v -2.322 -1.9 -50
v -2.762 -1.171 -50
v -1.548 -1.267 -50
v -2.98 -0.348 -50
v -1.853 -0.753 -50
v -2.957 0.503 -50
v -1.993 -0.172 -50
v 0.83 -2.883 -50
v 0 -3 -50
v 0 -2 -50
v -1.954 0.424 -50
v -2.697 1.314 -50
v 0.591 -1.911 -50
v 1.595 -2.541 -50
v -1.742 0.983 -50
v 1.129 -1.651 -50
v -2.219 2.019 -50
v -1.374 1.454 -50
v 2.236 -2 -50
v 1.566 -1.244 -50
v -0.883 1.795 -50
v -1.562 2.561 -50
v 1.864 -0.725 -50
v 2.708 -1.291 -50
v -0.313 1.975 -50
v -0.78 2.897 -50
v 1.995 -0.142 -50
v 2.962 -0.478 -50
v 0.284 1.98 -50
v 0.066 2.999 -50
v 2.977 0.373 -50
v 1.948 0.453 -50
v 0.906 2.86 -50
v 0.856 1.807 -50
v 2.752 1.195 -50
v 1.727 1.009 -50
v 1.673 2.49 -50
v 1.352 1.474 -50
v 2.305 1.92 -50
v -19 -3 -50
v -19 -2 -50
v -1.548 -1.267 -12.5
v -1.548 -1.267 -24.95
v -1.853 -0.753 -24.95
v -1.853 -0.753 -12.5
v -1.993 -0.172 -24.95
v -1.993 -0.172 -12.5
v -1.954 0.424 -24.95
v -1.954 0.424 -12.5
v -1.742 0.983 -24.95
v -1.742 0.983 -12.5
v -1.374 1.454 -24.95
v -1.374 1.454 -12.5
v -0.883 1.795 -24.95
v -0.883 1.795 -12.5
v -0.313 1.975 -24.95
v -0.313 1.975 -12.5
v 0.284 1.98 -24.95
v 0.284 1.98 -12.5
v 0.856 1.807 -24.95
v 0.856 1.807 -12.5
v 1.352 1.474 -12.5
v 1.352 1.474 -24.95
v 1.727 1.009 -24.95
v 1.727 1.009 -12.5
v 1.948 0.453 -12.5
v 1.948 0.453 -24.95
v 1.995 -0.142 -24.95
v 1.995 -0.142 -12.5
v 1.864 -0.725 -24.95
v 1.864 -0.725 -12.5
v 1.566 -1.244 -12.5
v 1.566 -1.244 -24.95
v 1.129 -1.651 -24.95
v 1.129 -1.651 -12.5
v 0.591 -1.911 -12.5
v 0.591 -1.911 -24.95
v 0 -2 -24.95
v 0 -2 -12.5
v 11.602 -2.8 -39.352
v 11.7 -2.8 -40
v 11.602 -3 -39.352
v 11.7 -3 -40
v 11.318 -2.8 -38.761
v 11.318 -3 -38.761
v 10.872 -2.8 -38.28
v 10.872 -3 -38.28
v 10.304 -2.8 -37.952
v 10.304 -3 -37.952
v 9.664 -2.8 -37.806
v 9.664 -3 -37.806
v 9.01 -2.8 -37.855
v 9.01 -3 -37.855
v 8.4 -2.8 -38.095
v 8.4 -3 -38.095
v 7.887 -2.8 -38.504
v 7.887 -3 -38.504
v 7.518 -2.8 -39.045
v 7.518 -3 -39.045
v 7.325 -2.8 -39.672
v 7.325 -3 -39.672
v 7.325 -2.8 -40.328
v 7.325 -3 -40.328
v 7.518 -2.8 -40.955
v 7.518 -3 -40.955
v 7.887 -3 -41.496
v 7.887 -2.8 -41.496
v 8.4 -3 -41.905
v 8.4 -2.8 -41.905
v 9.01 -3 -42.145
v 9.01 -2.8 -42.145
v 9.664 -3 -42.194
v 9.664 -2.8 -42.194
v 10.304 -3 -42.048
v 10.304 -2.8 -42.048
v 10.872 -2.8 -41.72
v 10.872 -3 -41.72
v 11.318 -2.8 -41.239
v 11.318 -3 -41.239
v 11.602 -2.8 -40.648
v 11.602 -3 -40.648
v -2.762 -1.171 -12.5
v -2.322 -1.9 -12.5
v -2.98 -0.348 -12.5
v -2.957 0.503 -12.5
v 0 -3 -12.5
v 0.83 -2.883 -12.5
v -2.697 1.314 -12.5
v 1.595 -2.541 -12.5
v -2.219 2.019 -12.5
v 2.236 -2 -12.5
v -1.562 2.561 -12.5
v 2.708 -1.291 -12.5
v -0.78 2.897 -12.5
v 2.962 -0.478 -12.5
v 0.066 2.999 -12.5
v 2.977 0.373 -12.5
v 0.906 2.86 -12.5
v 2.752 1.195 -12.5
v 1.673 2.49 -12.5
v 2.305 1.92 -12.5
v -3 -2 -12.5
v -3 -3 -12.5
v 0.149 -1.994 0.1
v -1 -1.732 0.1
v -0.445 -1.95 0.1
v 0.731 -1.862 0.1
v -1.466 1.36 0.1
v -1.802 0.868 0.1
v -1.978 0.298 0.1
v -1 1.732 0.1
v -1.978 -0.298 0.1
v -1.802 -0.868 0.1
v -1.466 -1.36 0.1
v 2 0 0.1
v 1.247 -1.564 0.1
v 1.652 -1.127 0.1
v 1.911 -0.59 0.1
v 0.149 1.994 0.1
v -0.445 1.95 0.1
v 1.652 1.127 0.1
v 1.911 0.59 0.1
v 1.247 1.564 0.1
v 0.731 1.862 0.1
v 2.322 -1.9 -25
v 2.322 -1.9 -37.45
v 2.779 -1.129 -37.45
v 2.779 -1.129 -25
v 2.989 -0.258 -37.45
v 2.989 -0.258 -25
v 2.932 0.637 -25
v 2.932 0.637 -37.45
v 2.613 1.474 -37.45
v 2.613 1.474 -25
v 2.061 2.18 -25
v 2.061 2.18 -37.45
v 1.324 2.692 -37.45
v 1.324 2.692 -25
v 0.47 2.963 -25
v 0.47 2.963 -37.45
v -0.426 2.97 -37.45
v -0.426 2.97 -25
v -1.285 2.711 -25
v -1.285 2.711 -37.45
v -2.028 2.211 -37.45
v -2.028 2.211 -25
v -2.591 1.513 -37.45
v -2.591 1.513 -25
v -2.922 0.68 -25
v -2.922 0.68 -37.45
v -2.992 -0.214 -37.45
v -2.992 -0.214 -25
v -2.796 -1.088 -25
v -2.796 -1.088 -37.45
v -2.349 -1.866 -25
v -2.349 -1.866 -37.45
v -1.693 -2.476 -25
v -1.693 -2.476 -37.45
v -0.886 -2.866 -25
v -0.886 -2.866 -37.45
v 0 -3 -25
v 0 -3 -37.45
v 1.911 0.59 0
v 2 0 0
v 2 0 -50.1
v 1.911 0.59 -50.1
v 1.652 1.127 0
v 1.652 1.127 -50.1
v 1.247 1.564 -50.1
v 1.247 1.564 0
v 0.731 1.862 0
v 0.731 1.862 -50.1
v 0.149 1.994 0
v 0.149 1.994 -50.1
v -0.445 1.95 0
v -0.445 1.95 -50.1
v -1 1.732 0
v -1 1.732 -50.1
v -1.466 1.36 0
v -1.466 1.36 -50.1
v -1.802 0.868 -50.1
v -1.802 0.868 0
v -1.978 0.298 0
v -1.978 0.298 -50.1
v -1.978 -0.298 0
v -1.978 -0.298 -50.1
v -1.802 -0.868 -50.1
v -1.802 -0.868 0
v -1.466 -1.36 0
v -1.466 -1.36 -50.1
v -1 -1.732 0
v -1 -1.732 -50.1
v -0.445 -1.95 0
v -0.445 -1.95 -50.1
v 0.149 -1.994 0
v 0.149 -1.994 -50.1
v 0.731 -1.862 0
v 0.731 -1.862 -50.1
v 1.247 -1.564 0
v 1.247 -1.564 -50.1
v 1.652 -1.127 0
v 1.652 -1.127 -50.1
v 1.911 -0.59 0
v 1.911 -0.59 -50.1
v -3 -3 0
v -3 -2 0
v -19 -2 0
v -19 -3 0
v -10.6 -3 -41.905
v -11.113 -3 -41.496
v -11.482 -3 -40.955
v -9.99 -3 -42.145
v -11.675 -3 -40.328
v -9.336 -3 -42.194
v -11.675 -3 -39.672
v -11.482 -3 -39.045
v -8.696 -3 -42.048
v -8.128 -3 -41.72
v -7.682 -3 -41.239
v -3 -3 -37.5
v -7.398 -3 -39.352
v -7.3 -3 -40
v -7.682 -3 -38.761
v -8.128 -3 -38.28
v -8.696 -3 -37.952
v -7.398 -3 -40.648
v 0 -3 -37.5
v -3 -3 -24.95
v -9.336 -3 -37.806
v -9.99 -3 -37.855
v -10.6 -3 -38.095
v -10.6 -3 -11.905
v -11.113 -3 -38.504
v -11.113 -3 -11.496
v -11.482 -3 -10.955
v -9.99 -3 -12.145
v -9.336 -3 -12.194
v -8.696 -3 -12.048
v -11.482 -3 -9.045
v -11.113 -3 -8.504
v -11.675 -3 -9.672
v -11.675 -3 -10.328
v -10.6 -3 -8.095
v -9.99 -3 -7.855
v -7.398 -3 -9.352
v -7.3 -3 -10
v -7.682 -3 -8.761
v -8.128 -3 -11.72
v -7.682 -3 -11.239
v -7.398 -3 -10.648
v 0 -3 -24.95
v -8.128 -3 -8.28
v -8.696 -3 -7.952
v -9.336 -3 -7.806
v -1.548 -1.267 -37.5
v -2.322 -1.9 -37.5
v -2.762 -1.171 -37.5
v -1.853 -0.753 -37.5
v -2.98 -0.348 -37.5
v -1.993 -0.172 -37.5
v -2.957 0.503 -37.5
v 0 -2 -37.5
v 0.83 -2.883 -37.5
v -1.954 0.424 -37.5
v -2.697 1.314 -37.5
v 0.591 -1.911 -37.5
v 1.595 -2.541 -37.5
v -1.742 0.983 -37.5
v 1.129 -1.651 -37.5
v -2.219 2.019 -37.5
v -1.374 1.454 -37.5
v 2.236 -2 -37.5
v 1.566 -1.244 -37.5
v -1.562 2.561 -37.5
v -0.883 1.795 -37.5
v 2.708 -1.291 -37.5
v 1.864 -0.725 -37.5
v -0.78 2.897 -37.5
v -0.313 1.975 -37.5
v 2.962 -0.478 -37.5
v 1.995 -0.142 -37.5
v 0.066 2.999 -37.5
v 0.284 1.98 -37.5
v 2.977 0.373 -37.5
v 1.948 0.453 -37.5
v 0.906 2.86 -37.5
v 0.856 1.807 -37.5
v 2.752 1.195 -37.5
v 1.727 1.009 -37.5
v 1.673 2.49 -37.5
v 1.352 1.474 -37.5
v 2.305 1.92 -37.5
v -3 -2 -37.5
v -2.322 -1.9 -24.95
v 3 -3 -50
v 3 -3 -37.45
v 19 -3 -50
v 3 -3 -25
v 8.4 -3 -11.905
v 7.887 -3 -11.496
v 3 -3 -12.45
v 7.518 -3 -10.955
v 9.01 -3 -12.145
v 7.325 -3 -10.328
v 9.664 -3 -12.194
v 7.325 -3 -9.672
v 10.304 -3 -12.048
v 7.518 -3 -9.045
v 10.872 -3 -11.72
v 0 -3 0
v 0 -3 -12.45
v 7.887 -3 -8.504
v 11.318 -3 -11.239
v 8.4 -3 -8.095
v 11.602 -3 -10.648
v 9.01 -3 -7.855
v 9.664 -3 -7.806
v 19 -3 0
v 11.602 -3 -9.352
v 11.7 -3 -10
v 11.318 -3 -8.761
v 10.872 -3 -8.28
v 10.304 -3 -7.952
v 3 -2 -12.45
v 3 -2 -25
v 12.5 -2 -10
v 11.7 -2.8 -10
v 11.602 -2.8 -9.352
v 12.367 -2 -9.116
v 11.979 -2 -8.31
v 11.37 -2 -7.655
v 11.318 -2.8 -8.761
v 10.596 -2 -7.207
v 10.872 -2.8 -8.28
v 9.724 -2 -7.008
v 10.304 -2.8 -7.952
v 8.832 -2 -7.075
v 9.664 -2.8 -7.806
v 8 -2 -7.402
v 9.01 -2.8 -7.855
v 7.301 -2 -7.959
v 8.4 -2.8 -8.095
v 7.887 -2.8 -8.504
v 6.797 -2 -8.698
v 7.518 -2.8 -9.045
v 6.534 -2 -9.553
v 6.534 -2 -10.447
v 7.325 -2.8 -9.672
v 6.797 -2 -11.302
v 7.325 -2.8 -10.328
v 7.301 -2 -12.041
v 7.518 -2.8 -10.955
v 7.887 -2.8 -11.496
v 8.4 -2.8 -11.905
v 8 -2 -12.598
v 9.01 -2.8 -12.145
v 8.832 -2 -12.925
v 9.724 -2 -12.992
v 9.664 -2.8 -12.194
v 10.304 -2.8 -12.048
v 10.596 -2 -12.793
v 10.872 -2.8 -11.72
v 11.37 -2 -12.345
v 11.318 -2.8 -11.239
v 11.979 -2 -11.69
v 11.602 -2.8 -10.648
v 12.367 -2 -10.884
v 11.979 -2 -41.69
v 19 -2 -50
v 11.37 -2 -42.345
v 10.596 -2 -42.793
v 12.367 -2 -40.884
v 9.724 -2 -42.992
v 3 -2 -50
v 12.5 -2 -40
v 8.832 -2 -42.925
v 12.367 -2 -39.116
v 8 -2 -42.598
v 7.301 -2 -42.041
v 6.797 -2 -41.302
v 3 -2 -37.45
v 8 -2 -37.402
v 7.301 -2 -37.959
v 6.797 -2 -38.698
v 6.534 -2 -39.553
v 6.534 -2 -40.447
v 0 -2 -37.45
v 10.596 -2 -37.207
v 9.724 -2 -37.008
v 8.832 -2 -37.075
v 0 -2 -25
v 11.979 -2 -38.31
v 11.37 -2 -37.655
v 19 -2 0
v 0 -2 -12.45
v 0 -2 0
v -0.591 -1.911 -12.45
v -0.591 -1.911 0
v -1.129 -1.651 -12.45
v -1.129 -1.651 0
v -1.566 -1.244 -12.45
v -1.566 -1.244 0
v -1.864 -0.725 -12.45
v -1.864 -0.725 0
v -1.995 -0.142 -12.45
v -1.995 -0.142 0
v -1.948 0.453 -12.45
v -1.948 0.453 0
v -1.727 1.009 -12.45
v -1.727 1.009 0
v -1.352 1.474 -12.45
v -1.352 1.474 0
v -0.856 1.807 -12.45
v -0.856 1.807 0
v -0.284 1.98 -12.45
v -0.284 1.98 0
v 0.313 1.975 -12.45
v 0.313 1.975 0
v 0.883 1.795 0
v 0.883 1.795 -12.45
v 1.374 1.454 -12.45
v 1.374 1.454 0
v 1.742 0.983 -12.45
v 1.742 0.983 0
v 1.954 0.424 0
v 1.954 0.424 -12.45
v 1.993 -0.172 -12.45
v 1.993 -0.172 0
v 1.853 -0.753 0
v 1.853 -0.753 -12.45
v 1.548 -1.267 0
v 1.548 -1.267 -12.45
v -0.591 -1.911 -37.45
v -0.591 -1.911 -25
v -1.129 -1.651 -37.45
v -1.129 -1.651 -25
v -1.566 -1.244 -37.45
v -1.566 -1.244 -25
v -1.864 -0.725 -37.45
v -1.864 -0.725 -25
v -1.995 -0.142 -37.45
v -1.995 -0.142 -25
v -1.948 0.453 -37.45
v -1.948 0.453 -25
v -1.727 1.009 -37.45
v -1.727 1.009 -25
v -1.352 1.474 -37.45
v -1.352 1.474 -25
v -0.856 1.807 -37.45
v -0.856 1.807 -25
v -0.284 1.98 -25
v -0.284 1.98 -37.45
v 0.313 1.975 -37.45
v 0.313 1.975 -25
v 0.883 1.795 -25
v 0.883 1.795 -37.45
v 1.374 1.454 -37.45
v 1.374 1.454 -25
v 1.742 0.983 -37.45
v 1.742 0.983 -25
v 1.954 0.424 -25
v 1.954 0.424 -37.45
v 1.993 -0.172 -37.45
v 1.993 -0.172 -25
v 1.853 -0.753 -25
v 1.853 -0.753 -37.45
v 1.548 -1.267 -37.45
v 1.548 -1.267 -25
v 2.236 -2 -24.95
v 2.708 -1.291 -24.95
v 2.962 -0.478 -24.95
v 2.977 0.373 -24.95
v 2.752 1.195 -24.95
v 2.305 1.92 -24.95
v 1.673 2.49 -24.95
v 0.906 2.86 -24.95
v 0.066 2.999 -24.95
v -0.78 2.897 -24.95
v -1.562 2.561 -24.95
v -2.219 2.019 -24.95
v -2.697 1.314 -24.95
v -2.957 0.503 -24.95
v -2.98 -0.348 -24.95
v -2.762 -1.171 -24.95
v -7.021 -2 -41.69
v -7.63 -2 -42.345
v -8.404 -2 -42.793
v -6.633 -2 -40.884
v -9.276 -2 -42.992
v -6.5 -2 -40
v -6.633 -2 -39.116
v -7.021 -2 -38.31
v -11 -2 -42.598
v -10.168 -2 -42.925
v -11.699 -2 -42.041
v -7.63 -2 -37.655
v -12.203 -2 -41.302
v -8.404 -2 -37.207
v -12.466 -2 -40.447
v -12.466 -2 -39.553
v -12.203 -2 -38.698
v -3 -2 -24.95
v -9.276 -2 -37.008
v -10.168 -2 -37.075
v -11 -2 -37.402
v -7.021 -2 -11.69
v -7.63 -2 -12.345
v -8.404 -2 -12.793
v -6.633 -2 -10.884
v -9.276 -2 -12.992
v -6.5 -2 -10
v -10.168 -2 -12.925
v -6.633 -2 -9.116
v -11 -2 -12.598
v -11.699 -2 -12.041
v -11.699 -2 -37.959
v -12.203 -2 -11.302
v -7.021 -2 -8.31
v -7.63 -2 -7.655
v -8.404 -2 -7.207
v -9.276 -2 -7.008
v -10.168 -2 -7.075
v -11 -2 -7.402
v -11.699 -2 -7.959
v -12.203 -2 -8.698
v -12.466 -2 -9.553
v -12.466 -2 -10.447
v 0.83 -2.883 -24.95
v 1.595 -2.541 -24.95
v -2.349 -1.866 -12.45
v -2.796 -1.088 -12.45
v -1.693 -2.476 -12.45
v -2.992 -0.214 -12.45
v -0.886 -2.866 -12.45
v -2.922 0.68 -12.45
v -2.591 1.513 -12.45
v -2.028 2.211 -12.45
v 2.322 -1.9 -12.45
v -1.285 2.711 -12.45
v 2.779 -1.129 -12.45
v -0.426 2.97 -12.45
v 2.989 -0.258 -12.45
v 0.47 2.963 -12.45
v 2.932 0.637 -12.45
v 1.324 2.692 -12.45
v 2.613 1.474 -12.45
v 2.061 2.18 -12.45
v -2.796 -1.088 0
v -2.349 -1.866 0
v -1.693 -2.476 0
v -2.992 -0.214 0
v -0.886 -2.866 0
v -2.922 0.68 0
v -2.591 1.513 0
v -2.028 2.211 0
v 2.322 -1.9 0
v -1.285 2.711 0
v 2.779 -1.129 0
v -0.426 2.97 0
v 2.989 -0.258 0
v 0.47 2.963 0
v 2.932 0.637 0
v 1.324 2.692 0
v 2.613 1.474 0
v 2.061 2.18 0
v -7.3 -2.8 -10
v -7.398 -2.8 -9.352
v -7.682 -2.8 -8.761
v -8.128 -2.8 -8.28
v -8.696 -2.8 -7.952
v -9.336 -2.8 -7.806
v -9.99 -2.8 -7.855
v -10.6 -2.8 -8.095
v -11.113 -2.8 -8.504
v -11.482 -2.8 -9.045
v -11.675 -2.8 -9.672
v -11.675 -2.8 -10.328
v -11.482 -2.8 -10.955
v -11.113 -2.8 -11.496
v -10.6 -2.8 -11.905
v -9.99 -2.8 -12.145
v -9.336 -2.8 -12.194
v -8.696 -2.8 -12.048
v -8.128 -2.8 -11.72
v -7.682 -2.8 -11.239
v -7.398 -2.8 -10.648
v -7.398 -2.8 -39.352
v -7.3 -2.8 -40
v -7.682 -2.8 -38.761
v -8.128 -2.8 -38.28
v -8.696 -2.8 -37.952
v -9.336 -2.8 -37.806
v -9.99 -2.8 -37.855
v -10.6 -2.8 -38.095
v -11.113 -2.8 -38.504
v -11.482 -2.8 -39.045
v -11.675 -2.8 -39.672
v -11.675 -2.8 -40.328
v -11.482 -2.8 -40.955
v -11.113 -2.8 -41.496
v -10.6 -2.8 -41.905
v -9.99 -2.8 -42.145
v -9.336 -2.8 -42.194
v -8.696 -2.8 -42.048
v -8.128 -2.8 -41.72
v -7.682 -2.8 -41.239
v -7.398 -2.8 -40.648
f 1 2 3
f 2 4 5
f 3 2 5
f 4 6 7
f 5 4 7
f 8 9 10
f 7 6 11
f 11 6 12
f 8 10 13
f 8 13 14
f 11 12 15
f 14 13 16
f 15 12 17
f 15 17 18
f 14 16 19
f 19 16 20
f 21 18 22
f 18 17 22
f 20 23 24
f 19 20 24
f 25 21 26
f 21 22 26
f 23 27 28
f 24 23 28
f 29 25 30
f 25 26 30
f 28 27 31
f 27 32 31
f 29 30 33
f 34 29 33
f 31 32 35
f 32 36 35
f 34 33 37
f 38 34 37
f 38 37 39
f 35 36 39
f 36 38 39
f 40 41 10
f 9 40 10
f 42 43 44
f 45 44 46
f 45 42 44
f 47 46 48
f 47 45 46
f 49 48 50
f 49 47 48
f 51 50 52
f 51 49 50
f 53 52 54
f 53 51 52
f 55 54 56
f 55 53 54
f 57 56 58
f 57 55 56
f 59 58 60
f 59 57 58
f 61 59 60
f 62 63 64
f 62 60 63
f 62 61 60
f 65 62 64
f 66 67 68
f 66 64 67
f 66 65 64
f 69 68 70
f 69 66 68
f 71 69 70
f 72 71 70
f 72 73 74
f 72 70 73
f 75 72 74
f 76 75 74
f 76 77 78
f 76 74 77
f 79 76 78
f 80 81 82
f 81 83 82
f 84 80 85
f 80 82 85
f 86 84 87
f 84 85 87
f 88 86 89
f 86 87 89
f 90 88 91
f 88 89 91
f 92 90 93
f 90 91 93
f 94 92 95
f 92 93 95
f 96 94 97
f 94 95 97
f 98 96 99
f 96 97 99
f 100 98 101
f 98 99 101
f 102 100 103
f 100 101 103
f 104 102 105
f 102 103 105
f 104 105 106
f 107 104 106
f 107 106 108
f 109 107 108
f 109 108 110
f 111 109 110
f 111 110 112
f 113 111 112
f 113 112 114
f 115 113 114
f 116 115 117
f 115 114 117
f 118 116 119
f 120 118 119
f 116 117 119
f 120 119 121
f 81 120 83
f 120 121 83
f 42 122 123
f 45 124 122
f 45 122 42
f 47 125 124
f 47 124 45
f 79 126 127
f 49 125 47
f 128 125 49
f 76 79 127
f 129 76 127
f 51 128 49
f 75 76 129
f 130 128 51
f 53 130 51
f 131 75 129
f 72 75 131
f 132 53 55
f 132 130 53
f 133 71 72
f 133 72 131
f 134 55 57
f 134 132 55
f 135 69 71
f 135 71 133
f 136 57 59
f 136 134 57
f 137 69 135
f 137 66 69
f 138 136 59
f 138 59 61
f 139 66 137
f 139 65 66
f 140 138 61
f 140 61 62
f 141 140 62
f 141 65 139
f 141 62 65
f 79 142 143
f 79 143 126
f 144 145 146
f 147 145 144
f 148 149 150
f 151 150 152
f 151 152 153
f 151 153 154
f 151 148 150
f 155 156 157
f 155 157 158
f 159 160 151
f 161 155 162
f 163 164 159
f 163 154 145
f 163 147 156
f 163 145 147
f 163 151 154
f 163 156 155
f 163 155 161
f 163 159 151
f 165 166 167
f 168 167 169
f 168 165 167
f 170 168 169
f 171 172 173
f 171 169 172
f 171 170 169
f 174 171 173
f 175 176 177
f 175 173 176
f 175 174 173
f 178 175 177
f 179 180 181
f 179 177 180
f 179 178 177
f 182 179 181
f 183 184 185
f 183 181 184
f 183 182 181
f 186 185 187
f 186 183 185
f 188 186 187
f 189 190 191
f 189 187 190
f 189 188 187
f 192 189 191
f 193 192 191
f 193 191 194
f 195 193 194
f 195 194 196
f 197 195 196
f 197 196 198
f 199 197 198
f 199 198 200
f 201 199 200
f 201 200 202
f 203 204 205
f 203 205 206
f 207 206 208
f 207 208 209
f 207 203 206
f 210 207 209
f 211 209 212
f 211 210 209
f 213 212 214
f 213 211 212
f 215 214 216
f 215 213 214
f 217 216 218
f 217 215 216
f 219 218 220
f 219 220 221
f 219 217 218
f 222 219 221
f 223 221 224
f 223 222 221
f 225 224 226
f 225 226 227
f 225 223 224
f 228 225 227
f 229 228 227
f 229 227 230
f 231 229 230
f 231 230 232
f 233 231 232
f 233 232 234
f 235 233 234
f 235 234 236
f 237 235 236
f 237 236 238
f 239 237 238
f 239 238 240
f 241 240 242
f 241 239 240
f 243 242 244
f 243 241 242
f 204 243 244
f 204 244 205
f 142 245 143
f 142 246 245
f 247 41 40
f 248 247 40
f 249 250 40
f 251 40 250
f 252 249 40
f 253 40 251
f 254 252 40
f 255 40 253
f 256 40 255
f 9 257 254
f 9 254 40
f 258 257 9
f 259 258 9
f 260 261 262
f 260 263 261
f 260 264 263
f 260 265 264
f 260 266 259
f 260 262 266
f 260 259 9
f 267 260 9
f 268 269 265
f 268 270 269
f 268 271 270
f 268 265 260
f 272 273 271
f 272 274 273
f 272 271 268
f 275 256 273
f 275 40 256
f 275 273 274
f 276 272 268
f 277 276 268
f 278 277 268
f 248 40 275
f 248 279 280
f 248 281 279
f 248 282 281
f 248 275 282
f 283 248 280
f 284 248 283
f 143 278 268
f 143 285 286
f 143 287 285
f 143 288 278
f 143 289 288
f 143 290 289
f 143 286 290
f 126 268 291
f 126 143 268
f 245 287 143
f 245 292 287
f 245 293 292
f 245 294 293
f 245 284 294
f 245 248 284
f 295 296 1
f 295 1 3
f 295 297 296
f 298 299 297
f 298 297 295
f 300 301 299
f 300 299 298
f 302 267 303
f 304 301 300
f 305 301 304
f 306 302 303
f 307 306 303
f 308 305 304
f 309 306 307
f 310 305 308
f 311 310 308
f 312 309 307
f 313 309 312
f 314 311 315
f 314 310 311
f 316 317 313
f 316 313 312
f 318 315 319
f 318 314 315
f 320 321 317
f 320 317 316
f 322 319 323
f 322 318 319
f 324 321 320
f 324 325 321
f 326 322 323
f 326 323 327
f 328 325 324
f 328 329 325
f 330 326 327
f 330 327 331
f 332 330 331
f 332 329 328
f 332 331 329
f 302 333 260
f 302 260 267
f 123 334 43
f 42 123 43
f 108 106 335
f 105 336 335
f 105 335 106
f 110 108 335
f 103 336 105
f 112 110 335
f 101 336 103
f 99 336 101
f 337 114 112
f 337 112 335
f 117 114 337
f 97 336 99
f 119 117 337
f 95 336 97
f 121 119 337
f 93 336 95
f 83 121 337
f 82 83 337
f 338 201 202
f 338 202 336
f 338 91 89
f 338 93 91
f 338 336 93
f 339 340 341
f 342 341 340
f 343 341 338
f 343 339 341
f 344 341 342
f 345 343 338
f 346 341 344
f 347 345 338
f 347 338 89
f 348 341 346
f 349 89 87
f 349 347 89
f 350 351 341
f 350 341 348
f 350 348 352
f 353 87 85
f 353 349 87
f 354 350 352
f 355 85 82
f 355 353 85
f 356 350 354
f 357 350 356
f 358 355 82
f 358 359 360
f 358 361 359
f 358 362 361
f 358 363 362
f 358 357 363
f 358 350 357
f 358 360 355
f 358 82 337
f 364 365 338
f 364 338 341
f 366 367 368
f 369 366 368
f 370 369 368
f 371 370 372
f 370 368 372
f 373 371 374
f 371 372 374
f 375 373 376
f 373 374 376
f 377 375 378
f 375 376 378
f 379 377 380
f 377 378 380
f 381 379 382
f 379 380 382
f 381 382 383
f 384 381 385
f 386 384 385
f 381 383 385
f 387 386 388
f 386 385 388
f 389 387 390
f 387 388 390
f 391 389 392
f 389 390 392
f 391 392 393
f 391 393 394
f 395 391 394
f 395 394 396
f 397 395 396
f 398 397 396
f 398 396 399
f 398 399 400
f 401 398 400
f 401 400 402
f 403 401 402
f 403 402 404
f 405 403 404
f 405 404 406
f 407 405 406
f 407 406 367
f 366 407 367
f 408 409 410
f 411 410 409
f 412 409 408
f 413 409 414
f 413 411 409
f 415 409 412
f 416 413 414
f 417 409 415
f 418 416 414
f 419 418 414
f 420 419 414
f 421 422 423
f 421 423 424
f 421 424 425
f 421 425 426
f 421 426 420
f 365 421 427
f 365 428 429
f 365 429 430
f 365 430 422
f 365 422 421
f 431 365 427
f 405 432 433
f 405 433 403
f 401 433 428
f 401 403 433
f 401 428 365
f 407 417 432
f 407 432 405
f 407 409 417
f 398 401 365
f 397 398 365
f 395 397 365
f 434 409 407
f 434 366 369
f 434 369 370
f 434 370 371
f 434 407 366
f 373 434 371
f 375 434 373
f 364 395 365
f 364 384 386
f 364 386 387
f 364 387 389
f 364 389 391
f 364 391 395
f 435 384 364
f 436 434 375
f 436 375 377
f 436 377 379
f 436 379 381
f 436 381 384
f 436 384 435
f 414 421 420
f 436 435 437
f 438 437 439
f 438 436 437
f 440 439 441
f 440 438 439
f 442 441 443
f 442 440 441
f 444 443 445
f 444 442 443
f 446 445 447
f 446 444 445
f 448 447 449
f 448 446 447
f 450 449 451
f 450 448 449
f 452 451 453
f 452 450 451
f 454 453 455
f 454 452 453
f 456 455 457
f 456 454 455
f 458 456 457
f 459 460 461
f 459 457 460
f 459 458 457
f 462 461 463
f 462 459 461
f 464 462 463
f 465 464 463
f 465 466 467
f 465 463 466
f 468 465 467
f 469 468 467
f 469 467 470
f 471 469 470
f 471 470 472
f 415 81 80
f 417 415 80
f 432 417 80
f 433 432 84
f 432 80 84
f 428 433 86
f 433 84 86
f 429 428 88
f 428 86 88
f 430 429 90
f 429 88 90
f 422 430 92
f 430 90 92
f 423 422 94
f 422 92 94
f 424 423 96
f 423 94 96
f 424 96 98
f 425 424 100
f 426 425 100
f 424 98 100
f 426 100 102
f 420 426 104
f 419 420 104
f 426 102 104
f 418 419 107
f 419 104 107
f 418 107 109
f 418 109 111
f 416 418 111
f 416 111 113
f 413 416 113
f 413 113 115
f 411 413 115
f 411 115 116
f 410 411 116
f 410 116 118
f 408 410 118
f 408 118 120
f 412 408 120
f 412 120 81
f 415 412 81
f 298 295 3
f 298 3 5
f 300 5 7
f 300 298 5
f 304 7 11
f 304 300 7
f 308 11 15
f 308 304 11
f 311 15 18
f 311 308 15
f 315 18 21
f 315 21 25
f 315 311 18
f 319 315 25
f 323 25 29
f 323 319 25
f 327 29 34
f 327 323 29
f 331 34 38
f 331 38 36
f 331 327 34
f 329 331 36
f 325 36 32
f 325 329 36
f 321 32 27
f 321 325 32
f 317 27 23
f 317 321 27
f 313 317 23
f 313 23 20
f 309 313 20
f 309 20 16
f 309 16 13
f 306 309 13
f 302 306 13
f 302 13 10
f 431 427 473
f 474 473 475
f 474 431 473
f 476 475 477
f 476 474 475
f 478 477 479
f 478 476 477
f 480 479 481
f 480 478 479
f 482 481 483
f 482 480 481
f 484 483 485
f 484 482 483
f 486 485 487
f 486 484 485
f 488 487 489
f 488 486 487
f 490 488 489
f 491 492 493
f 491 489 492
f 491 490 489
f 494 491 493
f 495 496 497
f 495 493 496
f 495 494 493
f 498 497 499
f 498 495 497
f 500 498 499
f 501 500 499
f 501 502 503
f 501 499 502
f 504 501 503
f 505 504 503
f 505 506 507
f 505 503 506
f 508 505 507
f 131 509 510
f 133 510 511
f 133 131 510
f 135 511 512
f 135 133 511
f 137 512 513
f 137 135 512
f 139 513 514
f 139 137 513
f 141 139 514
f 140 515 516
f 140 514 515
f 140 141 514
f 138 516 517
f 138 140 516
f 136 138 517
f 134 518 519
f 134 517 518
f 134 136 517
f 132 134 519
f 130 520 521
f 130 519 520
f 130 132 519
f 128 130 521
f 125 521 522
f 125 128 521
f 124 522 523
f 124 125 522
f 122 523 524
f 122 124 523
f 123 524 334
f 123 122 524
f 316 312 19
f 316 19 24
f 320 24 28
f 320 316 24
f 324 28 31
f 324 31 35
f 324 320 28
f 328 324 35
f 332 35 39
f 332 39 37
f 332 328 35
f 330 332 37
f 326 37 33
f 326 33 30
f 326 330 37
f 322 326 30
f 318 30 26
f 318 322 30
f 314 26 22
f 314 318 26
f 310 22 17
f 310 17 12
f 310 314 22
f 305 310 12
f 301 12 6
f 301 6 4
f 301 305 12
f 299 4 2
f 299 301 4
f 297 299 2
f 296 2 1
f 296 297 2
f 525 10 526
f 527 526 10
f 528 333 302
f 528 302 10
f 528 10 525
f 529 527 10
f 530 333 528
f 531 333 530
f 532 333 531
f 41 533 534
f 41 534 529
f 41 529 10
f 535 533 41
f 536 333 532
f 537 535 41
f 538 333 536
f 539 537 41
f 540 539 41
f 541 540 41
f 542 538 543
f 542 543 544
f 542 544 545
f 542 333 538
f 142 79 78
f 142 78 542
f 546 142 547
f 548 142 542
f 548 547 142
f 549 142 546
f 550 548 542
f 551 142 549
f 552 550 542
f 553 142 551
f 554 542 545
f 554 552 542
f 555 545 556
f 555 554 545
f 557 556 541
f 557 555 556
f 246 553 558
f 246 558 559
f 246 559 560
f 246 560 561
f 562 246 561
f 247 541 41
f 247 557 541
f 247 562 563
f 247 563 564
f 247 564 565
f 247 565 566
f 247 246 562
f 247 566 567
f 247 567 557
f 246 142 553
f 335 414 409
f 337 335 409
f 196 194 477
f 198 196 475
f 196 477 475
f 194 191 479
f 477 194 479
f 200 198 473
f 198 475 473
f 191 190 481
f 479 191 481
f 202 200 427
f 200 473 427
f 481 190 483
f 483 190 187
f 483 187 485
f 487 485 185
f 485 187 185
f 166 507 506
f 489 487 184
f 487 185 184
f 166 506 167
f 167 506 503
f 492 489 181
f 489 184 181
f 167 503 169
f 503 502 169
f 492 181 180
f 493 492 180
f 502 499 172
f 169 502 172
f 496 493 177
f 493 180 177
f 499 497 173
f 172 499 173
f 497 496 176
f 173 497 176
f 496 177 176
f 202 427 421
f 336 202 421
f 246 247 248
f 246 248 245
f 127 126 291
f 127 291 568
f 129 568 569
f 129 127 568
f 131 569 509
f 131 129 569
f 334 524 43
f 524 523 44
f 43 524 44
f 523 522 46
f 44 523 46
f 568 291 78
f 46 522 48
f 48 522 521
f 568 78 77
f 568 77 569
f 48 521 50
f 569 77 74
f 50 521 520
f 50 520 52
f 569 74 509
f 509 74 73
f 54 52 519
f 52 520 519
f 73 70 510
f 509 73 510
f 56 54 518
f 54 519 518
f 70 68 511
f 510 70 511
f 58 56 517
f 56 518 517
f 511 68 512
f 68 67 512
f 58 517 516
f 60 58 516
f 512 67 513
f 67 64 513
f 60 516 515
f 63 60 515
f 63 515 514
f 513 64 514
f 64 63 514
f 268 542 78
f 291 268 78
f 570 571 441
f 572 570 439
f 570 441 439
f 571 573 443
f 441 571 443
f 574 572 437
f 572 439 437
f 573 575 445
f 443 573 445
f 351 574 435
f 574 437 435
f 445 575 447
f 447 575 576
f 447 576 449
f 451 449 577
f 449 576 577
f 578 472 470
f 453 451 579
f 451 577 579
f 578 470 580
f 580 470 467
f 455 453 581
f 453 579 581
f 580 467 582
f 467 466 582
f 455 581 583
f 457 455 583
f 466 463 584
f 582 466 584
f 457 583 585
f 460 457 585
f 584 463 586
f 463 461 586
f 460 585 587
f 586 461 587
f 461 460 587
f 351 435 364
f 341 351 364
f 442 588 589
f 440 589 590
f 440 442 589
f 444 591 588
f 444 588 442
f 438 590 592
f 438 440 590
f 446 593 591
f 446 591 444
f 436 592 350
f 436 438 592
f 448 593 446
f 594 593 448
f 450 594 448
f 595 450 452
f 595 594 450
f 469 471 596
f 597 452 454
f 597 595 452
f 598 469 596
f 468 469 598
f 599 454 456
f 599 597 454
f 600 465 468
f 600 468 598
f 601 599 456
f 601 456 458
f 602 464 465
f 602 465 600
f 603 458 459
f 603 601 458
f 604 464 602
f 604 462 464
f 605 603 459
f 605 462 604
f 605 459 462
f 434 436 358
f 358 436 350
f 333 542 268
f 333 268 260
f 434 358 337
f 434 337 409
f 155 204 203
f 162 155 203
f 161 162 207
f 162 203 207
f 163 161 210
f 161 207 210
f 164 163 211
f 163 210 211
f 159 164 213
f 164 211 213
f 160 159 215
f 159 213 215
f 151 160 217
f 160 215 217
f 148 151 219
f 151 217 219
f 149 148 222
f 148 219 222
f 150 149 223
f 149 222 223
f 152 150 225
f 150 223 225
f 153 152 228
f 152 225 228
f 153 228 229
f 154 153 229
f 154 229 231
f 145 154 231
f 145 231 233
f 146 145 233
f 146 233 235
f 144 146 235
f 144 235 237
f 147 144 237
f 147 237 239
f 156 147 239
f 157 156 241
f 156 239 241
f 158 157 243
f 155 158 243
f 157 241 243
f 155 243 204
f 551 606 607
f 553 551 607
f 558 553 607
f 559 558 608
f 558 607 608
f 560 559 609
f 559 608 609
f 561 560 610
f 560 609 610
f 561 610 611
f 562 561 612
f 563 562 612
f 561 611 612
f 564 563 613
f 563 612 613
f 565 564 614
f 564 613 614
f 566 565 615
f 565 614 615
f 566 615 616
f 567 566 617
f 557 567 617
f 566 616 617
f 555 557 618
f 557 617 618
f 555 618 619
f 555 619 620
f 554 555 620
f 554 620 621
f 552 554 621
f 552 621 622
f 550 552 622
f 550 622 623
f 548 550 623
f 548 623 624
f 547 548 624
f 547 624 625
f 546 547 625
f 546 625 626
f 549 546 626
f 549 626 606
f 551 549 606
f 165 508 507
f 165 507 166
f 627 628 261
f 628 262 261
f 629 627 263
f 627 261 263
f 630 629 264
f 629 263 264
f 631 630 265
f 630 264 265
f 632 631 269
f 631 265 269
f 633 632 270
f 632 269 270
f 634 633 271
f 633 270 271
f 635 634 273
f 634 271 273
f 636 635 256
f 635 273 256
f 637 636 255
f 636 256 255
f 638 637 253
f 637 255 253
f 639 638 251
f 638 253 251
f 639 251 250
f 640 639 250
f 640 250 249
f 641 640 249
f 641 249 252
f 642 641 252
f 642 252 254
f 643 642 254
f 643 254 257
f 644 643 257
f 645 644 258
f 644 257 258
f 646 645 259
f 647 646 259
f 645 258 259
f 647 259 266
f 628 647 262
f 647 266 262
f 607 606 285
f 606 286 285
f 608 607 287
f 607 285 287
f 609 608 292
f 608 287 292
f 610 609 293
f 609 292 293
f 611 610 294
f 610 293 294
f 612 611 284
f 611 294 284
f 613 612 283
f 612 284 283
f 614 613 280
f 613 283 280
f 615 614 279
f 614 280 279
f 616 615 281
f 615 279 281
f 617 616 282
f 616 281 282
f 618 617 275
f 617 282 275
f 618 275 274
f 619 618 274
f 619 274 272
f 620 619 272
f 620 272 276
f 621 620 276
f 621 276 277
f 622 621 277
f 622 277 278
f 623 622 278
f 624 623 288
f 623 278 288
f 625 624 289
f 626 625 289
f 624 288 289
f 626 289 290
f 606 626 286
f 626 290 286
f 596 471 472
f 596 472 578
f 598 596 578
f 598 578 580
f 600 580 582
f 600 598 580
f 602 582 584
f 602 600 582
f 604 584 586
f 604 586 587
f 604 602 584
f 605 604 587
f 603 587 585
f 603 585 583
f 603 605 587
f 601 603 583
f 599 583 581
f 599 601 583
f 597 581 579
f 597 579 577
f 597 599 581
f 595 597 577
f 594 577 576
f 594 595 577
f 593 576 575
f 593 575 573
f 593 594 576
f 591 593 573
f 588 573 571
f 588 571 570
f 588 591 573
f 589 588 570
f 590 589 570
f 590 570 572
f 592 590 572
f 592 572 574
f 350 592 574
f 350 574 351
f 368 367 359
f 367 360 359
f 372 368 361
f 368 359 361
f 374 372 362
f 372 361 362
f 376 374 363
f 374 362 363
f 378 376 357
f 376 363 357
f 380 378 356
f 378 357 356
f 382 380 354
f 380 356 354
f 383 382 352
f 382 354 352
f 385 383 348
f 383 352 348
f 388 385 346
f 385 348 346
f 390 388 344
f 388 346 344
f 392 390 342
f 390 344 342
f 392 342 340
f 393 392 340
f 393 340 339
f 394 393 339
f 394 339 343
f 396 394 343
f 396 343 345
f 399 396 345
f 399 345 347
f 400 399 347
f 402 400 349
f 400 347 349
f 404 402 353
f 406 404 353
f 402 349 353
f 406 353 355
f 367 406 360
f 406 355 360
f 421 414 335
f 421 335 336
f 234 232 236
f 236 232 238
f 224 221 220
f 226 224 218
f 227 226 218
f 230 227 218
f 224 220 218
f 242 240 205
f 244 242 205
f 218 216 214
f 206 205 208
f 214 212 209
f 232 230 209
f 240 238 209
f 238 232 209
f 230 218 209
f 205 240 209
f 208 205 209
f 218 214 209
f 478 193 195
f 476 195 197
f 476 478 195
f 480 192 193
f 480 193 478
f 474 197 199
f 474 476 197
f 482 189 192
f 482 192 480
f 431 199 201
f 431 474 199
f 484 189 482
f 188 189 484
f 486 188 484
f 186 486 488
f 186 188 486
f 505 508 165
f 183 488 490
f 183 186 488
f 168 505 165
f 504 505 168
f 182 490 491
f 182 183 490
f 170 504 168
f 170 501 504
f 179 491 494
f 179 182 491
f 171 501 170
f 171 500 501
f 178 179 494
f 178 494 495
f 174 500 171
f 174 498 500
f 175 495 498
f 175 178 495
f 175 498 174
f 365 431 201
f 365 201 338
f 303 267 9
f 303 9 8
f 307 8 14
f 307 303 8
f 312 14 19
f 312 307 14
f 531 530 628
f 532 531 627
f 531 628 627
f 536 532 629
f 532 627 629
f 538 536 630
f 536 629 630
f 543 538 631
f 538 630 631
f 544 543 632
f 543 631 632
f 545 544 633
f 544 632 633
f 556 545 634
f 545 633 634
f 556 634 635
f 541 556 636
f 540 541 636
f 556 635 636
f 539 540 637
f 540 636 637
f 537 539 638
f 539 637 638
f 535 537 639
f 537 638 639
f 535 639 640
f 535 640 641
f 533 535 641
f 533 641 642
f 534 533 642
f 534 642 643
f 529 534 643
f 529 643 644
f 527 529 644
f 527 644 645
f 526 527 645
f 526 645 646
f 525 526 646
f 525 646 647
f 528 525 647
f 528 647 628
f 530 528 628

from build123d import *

# Parameters (mm, degrees)
F1_DEPTH          = 50
F3_DEPTH          = 50
F4_W              = 6
F4_H              = 0.05
F4_H_2            = 12.45
F4_H_3            = 12.5
F5_DEPTH          = 3.001
F5_DEPTH_BACK     = 3.001
F6_DEPTH          = 3.001
F6_DEPTH_BACK     = 3.001
F7_R              = 2
F8_DEPTH          = 50.1
F8_DEPTH_BACK     = 0.1
F10_D             = 4.4
F10_DEPTH         = 10
F10_CSINK_D       = 6
F10_CSINK_ANGLE   = 90
F10_TIP           = 1.3218933619
F10_2_D           = 4.4
F10_2_DEPTH       = 10
F10_2_CSINK_D     = 6
F10_2_CSINK_ANGLE = 90
F10_2_TIP         = 1.3218933619


with BuildPart() as f1:
    # F0 (on Top) → F1 (new body)
    with BuildSketch(Plane.XY):
        with BuildLine():
            Line((-19, -3), (0, -3))
            ThreePointArc((0, -3), (1.2247448714, -2.7386127875), (2.2360679775, -2))
            ThreePointArc((2.2360679775, -2), (0.0658067589, 2.9992781582), (-2.3216373532, -1.9))
            Line((-2.3216373532, -1.9), (-1.5477582355, -1.2666666667))
            ThreePointArc((-1.5477582355, -1.2666666667), (0.8563488386, 1.8073922282), (0, -2))
            Line((0, -2), (-19, -2))
            Line((-19, -2), (-19, -3))
        make_face()
    extrude(amount=-F1_DEPTH)

    # F4 (on Front) → F5 (cut, two sides)
    with BuildSketch(Plane.XZ) as f5_sk:
        with Locations((0, -37.475)):
            Rectangle(F4_W, F4_H)
        with Locations((0, -31.225)):
            Rectangle(F4_W, F4_H_2)
        with Locations((0, -24.975)):
            Rectangle(F4_W, F4_H)
        with Locations((0, -12.475)):
            Rectangle(F4_W, F4_H)
        with Locations((0, -6.2)):
            Rectangle(F4_W, F4_H_3)
    extrude(amount=-F5_DEPTH, mode=Mode.SUBTRACT)
    extrude(f5_sk.sketch, amount=F5_DEPTH_BACK, mode=Mode.SUBTRACT)

    # F10
    with Locations(Plane(origin=(0, -2, 0), x_dir=(-1, 0, 0), z_dir=(0, 1, 0))):
        with Locations((9.5, -10), (9.5, -40), (-9.5, -40), (-9.5, -10)):
            CounterSinkHole(F10_D / 2, F10_CSINK_D / 2, depth=F10_DEPTH, counter_sink_angle=F10_CSINK_ANGLE)
            with Locations((0, 0, -(F10_DEPTH + F10_TIP / 2))):  # 118° drill point
                Cone(0, F10_D / 2, F10_TIP, mode=Mode.SUBTRACT)


with BuildPart() as f3:
    # F2 (on Top) → F3 (new body)
    with BuildSketch(Plane.XY):
        with BuildLine():
            Line((1.5477582355, -1.2666666667), (2.3216373532, -1.9))
            ThreePointArc((2.3216373532, -1.9), (-1.2845232579, 2.7110883423), (0, -3))
            Line((0, -3), (19, -3))
            Line((19, -3), (19, -2))
            Line((19, -2), (0, -2))
            ThreePointArc((0, -2), (-0.8563488386, 1.8073922282), (1.5477582355, -1.2666666667))
        make_face()
    extrude(amount=-F3_DEPTH)

    # F4 (on Front) → F6 (cut, two sides)
    with BuildSketch(Plane.XZ) as f6_sk:
        with Locations((0, -43.75)):
            Rectangle(F4_W, F4_H_3)
        with Locations((0, -37.475)):
            Rectangle(F4_W, F4_H)
        with Locations((0, -24.975)):
            Rectangle(F4_W, F4_H)
        with Locations((0, -18.725)):
            Rectangle(F4_W, F4_H_2)
        with Locations((0, -12.475)):
            Rectangle(F4_W, F4_H)
    extrude(amount=-F6_DEPTH, mode=Mode.SUBTRACT)
    extrude(f6_sk.sketch, amount=F6_DEPTH_BACK, mode=Mode.SUBTRACT)

    # F10#2
    with Locations(Plane(origin=(0, -2, 0), x_dir=(-1, 0, 0), z_dir=(0, 1, 0))):
        with Locations((9.5, -10), (9.5, -40), (-9.5, -40), (-9.5, -10)):
            CounterSinkHole(F10_2_D / 2, F10_2_CSINK_D / 2, depth=F10_2_DEPTH, counter_sink_angle=F10_2_CSINK_ANGLE)
            with Locations((0, 0, -(F10_2_DEPTH + F10_2_TIP / 2))):  # 118° drill point
                Cone(0, F10_2_D / 2, F10_2_TIP, mode=Mode.SUBTRACT)


with BuildPart() as f8:
    # F7 (on Top) → F8 (new body, two sides)
    with BuildSketch(Plane.XY) as f8_sk:
        Circle(F7_R)
    extrude(amount=-F8_DEPTH)
    extrude(f8_sk.sketch, amount=F8_DEPTH_BACK)


solid = Compound([f1.part, f3.part, f8.part])
